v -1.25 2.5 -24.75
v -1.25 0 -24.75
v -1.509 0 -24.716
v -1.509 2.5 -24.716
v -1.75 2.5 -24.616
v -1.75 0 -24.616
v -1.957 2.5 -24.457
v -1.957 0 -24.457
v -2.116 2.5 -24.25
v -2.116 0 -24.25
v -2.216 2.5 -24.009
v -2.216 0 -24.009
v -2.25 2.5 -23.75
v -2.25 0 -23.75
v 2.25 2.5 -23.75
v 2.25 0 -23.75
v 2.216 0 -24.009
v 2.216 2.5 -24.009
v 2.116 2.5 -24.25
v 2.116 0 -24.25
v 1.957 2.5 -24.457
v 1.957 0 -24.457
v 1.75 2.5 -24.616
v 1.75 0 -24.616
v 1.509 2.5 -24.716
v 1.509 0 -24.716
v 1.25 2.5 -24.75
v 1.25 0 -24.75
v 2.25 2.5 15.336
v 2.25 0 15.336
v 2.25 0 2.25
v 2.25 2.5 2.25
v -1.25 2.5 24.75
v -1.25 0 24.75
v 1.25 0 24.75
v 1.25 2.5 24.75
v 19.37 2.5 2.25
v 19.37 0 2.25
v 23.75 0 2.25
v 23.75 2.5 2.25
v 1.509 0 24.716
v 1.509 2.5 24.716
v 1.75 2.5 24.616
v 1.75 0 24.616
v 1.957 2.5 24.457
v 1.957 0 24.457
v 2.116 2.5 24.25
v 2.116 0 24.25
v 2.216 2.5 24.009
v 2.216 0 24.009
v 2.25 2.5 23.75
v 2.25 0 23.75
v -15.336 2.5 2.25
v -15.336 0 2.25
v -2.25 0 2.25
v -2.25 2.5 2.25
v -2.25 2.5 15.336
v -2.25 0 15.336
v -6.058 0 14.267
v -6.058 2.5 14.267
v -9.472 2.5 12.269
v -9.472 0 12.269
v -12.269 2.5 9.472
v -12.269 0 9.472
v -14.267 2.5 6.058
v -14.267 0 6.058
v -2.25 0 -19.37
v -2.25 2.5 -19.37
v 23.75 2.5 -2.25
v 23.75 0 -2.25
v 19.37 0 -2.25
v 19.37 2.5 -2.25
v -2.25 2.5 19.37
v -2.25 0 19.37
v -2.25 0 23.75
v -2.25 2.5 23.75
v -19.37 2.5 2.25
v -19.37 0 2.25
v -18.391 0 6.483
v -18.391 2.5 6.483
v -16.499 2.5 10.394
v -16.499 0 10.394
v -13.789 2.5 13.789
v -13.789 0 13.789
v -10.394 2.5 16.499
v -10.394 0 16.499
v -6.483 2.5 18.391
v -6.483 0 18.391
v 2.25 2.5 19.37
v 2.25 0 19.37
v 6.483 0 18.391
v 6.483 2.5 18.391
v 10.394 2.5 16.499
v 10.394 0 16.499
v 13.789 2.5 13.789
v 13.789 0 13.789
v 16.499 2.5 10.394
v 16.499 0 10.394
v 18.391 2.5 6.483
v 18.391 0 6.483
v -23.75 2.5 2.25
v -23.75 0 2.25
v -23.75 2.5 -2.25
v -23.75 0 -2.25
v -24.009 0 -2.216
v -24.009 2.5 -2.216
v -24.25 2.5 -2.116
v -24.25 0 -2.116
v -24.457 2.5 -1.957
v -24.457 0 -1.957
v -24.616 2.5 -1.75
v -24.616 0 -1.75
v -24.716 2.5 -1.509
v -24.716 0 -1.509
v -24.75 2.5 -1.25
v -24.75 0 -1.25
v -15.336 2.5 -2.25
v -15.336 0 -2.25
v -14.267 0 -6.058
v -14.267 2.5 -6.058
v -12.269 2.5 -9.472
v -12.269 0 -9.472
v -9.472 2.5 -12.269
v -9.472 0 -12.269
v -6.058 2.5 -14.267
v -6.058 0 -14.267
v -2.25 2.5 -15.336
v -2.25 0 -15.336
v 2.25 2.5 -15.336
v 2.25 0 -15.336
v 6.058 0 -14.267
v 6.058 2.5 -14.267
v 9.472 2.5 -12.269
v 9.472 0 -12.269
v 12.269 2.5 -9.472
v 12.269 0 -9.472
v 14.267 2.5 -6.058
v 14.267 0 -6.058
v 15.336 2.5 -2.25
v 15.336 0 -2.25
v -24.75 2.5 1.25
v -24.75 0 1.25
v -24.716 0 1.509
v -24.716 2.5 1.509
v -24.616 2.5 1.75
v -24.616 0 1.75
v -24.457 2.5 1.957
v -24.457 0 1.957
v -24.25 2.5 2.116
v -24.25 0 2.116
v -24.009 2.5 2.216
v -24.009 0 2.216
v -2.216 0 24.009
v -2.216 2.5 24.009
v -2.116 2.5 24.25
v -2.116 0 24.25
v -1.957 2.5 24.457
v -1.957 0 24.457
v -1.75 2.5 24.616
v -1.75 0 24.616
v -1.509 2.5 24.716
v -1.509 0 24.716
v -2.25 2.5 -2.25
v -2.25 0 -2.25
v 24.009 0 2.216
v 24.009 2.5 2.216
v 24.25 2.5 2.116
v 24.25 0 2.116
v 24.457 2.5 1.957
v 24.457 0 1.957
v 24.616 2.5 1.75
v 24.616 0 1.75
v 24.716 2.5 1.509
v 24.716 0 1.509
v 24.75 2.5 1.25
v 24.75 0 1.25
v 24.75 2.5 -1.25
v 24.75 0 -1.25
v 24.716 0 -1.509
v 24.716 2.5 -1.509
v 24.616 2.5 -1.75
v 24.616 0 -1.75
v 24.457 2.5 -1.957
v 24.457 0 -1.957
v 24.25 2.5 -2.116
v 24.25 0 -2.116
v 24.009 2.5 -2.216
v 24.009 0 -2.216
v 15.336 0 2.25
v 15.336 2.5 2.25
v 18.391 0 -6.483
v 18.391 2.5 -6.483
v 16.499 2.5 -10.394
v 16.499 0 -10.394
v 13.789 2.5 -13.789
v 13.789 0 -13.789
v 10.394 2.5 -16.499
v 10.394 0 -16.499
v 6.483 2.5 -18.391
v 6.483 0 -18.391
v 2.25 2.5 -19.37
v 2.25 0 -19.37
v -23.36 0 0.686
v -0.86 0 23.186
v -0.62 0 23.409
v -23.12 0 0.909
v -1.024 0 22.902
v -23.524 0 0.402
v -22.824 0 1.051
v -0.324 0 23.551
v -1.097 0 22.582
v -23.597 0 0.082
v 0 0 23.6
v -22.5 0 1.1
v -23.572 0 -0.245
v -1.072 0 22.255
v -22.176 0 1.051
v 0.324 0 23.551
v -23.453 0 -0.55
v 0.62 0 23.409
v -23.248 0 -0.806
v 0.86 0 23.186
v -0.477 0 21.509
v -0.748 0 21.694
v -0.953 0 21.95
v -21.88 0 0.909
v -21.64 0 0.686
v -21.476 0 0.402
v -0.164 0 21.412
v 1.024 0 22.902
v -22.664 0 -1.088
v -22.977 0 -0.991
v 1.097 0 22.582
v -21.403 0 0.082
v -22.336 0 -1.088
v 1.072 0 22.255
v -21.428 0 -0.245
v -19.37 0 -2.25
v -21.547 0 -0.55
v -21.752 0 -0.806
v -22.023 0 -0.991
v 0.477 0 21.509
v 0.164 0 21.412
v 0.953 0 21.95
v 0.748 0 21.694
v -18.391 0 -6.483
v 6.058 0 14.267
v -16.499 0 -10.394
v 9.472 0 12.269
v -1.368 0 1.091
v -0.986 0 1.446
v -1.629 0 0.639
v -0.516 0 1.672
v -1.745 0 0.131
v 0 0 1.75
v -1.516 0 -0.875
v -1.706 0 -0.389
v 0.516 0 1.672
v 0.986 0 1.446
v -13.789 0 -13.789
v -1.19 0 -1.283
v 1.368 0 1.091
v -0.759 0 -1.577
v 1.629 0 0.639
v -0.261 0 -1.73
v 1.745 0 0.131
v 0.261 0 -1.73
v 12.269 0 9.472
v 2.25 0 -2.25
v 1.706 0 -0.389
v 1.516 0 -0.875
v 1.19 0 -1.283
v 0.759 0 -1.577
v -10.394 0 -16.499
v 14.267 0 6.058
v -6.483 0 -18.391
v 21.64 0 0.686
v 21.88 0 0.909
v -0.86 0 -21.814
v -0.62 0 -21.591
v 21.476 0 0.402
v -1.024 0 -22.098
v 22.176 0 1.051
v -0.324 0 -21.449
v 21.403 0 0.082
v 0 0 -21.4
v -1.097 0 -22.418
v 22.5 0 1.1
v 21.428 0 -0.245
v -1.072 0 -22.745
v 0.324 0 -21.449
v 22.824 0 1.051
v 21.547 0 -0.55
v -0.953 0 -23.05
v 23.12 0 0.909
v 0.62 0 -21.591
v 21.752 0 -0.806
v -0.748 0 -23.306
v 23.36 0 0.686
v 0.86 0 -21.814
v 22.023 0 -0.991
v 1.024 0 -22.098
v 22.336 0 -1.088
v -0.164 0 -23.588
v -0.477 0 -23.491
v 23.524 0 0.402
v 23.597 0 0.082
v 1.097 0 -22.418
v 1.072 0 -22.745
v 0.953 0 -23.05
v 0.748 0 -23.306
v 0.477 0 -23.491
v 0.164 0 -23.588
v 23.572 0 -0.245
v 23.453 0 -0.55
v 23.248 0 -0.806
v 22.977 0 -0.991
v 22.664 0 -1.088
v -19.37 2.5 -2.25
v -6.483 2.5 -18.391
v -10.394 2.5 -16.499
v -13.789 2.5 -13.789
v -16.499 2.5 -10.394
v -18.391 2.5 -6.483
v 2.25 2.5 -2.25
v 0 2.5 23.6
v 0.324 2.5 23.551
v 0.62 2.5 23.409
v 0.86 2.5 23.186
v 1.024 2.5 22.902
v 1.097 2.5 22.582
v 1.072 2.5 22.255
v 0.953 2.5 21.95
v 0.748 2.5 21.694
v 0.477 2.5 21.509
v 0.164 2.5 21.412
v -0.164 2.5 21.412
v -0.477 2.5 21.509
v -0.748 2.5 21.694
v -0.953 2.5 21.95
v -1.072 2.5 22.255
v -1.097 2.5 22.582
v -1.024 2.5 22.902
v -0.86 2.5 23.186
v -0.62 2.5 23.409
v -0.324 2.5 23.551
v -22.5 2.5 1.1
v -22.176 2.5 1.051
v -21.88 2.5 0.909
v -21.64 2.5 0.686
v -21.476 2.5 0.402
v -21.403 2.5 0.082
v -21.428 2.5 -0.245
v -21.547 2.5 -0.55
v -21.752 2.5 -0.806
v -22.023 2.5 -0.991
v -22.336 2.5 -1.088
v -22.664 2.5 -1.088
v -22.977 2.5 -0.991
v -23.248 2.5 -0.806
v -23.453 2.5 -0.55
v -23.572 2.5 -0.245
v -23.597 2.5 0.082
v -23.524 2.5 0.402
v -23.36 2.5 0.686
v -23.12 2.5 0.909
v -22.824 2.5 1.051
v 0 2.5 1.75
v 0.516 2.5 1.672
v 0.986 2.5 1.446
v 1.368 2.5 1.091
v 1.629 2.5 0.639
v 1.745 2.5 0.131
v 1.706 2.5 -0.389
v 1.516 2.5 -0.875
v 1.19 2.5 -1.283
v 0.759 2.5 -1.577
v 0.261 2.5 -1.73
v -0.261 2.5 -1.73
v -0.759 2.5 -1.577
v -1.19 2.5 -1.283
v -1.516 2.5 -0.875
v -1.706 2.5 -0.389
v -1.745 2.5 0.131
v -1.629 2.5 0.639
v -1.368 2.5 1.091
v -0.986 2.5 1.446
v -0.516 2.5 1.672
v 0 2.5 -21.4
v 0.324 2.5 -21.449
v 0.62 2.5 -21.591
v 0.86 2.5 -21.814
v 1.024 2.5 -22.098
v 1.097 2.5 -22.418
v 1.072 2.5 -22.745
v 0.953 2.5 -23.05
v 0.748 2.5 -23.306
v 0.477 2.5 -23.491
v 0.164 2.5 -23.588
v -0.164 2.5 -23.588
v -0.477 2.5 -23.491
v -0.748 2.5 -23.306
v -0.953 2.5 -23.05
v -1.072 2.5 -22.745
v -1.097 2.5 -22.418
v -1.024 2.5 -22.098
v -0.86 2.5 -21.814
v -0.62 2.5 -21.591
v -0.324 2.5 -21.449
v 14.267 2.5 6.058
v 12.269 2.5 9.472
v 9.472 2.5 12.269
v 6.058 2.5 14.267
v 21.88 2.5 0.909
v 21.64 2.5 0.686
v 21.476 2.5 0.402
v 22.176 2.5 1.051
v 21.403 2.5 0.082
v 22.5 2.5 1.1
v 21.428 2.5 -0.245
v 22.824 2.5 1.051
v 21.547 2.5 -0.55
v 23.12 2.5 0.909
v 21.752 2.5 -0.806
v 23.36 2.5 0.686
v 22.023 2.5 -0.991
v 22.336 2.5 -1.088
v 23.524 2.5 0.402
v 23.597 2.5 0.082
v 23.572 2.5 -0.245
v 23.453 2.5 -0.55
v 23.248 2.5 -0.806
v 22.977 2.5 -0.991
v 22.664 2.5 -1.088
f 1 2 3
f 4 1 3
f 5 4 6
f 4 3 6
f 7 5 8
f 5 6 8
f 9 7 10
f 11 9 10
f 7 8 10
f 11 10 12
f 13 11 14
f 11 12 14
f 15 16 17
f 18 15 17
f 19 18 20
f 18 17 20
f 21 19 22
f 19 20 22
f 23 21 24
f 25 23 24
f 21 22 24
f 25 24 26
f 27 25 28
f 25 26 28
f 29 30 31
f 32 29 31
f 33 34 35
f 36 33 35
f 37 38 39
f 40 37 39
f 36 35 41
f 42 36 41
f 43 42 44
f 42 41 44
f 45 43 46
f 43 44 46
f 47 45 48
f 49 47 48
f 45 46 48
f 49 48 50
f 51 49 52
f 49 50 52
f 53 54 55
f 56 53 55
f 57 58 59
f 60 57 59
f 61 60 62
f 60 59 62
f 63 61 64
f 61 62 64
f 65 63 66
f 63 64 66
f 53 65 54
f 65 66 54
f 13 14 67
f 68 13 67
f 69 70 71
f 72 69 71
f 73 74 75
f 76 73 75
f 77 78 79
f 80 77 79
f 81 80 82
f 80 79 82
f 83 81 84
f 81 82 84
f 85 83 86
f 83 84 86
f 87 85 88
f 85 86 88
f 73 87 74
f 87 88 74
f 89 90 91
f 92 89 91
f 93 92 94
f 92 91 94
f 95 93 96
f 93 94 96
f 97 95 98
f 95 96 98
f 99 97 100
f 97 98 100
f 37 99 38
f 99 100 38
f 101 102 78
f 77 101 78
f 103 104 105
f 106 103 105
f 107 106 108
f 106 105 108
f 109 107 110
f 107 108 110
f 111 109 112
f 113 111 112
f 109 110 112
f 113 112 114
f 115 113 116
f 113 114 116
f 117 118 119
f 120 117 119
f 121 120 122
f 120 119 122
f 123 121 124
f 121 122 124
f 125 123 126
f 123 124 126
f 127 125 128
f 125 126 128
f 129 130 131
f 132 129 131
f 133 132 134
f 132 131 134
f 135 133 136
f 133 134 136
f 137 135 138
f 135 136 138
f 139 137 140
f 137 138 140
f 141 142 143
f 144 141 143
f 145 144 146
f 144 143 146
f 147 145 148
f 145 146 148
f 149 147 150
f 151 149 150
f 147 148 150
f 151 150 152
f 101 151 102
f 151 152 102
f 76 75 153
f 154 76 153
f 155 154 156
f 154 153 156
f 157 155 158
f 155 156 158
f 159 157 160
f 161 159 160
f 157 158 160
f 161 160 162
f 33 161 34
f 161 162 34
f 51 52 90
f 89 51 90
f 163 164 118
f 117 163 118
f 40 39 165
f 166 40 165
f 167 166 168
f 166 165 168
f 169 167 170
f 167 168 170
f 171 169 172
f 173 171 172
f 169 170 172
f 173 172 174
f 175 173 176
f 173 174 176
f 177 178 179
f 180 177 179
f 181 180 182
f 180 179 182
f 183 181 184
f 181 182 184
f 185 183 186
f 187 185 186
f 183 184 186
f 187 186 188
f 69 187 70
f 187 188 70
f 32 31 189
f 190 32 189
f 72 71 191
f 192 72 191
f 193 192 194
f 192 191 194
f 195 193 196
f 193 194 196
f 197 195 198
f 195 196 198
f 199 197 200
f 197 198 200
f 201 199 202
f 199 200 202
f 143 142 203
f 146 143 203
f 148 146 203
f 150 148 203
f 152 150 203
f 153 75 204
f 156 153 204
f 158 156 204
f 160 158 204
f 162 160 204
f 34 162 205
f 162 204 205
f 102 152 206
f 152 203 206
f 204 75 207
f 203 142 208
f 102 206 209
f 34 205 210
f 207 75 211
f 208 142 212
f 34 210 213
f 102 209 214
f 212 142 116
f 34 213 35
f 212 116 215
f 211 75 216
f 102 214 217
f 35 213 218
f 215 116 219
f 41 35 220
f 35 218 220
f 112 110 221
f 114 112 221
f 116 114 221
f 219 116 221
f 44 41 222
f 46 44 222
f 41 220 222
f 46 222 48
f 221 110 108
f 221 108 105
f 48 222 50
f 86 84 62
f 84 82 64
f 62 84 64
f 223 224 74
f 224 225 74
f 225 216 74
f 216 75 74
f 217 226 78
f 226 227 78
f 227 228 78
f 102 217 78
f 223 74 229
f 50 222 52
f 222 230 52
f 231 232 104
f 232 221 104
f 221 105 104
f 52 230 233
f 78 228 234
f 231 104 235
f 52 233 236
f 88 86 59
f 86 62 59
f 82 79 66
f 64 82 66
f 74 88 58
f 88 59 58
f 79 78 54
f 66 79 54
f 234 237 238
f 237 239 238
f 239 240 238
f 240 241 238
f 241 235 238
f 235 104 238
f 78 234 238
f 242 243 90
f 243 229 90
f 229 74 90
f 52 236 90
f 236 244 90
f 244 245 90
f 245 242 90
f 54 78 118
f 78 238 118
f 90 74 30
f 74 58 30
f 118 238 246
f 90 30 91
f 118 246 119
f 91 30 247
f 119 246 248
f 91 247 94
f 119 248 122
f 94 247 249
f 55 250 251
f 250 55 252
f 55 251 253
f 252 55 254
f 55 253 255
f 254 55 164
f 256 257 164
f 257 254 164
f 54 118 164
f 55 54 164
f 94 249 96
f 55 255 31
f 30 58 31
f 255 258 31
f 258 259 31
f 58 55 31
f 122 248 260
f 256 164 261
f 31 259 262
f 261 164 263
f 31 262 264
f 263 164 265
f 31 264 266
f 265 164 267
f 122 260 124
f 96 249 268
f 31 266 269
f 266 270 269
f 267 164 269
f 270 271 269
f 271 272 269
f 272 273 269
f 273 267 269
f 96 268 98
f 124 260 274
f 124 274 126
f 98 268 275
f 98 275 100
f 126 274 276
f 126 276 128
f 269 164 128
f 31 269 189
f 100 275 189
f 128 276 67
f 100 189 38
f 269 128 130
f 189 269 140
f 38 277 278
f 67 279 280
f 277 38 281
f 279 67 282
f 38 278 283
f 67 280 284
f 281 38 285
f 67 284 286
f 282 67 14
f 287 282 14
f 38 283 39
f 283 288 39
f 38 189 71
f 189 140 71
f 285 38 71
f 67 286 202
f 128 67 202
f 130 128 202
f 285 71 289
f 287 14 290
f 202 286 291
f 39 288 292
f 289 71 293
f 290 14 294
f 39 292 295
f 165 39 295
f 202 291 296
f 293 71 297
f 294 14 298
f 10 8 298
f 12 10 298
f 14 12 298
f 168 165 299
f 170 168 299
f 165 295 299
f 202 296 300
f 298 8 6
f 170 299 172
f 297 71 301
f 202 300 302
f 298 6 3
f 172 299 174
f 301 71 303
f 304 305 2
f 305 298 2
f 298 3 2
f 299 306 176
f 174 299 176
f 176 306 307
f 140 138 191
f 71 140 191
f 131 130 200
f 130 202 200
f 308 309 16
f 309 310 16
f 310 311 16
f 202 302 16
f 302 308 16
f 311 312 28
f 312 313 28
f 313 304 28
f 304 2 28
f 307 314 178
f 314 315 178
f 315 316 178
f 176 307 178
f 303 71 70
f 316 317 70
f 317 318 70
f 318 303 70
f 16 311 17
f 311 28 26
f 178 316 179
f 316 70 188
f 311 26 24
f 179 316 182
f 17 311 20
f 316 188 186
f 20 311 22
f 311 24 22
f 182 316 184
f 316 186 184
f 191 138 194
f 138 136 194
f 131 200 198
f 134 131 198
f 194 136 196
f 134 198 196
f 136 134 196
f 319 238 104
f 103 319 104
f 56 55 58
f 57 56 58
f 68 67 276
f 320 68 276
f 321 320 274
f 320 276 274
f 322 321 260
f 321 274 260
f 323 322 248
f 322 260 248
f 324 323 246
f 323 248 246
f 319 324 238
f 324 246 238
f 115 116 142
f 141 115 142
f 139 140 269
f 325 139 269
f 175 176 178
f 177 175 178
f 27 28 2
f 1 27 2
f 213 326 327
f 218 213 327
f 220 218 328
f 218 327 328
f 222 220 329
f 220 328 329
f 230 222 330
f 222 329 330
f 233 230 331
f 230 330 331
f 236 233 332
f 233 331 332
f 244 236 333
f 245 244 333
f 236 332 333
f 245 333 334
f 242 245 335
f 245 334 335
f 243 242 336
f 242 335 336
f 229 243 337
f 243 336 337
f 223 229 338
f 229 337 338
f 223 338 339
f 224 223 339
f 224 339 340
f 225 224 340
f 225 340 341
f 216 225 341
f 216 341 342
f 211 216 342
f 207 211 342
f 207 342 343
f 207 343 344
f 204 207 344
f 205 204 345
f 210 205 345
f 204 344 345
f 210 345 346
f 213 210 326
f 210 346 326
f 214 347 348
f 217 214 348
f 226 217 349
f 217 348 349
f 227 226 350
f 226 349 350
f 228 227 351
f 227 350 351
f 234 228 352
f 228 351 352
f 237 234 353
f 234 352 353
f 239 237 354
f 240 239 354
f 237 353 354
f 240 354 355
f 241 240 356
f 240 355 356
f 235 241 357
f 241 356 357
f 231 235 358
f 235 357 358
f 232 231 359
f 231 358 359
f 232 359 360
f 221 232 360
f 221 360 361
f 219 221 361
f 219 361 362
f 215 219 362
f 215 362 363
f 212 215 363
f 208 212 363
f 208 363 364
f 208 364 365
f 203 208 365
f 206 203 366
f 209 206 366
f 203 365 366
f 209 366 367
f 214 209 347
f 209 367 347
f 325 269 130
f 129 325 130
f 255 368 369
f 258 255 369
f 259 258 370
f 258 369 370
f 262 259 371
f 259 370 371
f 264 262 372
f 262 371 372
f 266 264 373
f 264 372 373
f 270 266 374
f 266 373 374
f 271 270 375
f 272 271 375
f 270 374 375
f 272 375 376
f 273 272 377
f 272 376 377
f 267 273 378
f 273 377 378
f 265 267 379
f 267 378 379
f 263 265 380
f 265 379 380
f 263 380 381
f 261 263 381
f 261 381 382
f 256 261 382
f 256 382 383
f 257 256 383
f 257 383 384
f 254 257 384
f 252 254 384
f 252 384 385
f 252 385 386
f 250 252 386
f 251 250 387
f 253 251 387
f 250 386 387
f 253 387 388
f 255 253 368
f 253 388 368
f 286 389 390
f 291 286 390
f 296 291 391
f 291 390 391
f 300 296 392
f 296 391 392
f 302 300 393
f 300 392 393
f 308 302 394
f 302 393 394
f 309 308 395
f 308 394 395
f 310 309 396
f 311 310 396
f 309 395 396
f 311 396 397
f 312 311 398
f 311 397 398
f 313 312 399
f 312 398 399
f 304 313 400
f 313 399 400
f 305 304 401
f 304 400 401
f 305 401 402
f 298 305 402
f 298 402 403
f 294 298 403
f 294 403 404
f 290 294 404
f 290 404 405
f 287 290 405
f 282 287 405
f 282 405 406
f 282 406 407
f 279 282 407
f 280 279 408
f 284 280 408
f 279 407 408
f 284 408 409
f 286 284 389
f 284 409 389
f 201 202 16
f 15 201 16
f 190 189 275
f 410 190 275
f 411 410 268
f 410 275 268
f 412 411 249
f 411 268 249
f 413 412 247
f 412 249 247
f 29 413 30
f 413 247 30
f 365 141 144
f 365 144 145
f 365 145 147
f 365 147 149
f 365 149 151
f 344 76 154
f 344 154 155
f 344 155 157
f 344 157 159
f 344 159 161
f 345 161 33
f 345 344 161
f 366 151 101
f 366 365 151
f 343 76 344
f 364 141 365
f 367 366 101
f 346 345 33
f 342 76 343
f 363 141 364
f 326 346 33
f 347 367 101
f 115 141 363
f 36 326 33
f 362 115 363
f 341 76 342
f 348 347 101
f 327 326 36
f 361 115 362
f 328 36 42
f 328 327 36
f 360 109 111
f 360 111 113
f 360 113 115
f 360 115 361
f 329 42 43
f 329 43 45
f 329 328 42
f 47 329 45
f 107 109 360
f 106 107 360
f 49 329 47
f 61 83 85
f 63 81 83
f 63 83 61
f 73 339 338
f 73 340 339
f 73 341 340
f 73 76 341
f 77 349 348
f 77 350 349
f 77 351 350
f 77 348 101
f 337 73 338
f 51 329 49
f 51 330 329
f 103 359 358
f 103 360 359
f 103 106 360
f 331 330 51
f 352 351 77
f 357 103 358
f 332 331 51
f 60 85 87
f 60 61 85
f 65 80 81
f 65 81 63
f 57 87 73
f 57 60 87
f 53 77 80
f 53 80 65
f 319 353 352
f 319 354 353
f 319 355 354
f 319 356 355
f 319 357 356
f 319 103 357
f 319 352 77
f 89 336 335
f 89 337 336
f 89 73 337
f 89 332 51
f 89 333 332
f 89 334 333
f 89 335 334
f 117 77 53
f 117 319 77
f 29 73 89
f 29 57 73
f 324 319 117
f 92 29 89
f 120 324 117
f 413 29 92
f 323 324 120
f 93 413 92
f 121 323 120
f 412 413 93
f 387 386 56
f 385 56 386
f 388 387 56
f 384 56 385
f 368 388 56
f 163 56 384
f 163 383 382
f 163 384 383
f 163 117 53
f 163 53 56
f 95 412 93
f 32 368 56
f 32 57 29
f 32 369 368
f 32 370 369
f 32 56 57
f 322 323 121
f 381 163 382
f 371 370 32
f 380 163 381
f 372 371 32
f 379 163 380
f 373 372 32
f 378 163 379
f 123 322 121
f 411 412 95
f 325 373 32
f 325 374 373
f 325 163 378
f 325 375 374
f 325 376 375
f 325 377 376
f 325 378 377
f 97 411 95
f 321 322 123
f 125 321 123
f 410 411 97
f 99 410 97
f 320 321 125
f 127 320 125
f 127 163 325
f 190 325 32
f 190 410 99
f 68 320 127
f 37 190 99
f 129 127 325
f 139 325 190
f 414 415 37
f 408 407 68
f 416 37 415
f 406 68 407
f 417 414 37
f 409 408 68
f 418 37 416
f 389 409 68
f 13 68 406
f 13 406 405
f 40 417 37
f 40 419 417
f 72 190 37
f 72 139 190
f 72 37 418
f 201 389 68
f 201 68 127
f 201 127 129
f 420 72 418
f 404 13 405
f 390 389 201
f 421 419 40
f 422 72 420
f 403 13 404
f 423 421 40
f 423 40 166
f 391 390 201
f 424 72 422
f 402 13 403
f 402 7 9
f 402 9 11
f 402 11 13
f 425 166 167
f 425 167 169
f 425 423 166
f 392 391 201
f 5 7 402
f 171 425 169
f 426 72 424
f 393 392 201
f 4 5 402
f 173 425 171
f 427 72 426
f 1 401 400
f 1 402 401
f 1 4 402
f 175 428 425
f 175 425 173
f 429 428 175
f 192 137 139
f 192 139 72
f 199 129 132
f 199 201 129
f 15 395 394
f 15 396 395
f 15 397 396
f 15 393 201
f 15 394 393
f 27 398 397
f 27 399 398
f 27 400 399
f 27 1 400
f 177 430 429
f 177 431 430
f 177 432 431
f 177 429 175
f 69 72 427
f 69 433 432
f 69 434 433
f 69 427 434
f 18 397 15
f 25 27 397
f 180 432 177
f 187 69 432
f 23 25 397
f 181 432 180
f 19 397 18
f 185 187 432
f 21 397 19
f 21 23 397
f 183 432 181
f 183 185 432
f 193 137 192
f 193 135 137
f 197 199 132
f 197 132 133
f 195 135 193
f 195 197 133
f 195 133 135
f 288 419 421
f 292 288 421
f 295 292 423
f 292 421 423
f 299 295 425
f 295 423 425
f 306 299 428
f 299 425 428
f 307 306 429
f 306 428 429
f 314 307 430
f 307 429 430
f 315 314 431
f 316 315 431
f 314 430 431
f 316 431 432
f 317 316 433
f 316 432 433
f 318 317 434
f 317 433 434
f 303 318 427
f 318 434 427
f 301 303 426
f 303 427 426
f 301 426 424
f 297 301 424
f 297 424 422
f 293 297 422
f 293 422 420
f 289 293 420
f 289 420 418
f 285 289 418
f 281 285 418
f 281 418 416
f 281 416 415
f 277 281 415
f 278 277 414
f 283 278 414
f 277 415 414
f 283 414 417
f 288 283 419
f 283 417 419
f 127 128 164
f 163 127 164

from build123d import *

# Parameters (mm, degrees)
CROQUIS1_W              = 4.5
CROQUIS1_H              = 4.5
SALIENTE_EXTRUIR1_DEPTH = 2.5
CROQUIS2_R              = 1.75
CROQUIS2_R_2            = 1.1
CORTAR_EXTRUIR1_DEPTH   = 2.5


with BuildPart() as part:
    # Croquis1 → Saliente-Extruir1 (new body)
    with BuildSketch(Plane(origin=(0, 0, 0), x_dir=(1, 0, 0), z_dir=(0, 1, 0))):
        with BuildLine():
            ThreePointArc((-19.369757355, -2.25), (-13.788582233, -13.788582233), (-2.25, -19.369757355))
            Line((-2.25, -19.369757355), (-2.25, -15.335824073))
            ThreePointArc((-2.25, -15.335824073), (-10.960155108, -10.960155108), (-15.335824073, -2.25))
            Line((-15.335824073, -2.25), (-19.369757355, -2.25))
        make_face()
        with BuildLine():
            Line((-23.75, -2.25), (-19.369757355, -2.25))
            ThreePointArc((-19.369757355, -2.25), (-19.5, 0), (-19.369757355, 2.25))
            Line((-19.369757355, 2.25), (-23.75, 2.25))
            ThreePointArc((-23.75, 2.25), (-24.457106781, 1.957106781), (-24.75, 1.25))
            Line((-24.75, 1.25), (-24.75, -1.25))
            ThreePointArc((-24.75, -1.25), (-24.457106781, -1.957106781), (-23.75, -2.25))
        make_face()
        with BuildLine():
            Line((15.335824073, -2.25), (19.369757355, -2.25))
            ThreePointArc((19.369757355, -2.25), (19.467412109, -1.126883218), (19.5, 0))
            ThreePointArc((19.5, 0), (19.467412109, 1.126883218), (19.369757355, 2.25))
            Line((19.369757355, 2.25), (15.335824073, 2.25))
            ThreePointArc((15.335824073, 2.25), (15.458901532, 1.127990884), (15.5, 0))
            ThreePointArc((15.5, 0), (15.458901532, -1.127990884), (15.335824073, -2.25))
        make_face()
        with BuildLine():
            ThreePointArc((-19.369757355, 2.25), (-19.5, 0), (-19.369757355, -2.25))
            Line((-19.369757355, -2.25), (-15.335824073, -2.25))
            ThreePointArc((-15.335824073, -2.25), (-15.5, 0), (-15.335824073, 2.25))
            Line((-15.335824073, 2.25), (-19.369757355, 2.25))
        make_face()
        with BuildLine():
            Line((-2.25, 23.75), (-2.25, 19.369757355))
            ThreePointArc((-2.25, 19.369757355), (0, 19.5), (2.25, 19.369757355))
            Line((2.25, 19.369757355), (2.25, 23.75))
            ThreePointArc((2.25, 23.75), (1.957106781, 24.457106781), (1.25, 24.75))
            Line((1.25, 24.75), (-1.25, 24.75))
            ThreePointArc((-1.25, 24.75), (-1.957106781, 24.457106781), (-2.25, 23.75))
        make_face()
        with BuildLine():
            ThreePointArc((-2.25, 19.369757355), (-13.788582233, 13.788582233), (-19.369757355, 2.25))
            Line((-19.369757355, 2.25), (-15.335824073, 2.25))
            ThreePointArc((-15.335824073, 2.25), (-10.960155108, 10.960155108), (-2.25, 15.335824073))
            Line((-2.25, 15.335824073), (-2.25, 19.369757355))
        make_face()
        with BuildLine():
            ThreePointArc((-2.25, -19.369757355), (0, -19.5), (2.25, -19.369757355))
            Line((2.25, -19.369757355), (2.25, -15.335824073))
            ThreePointArc((2.25, -15.335824073), (0, -15.5), (-2.25, -15.335824073))
            Line((-2.25, -15.335824073), (-2.25, -19.369757355))
        make_face()
        with BuildLine():
            ThreePointArc((2.25, 19.369757355), (0, 19.5), (-2.25, 19.369757355))
            Line((-2.25, 19.369757355), (-2.25, 15.335824073))
            ThreePointArc((-2.25, 15.335824073), (0, 15.5), (2.25, 15.335824073))
            Line((2.25, 15.335824073), (2.25, 19.369757355))
        make_face()
        with BuildLine():
            Line((15.335824073, 2.25), (19.369757355, 2.25))
            ThreePointArc((19.369757355, 2.25), (13.788582233, 13.788582233), (2.25, 19.369757355))
            Line((2.25, 19.369757355), (2.25, 15.335824073))
            ThreePointArc((2.25, 15.335824073), (10.960155108, 10.960155108), (15.335824073, 2.25))
        make_face()
        with BuildLine():
            ThreePointArc((19.5, 0), (19.467412109, -1.126883218), (19.369757355, -2.25))
            Line((19.369757355, -2.25), (23.75, -2.25))
            ThreePointArc((23.75, -2.25), (24.457106781, -1.957106781), (24.75, -1.25))
            Line((24.75, -1.25), (24.75, 1.25))
            ThreePointArc((24.75, 1.25), (24.457106781, 1.957106781), (23.75, 2.25))
            Line((23.75, 2.25), (19.369757355, 2.25))
            ThreePointArc((19.369757355, 2.25), (19.467412109, 1.126883218), (19.5, 0))
        make_face()
        with BuildLine():
            Line((-1.25, -24.75), (1.25, -24.75))
            ThreePointArc((1.25, -24.75), (1.957106781, -24.457106781), (2.25, -23.75))
            Line((2.25, -23.75), (2.25, -19.369757355))
            ThreePointArc((2.25, -19.369757355), (0, -19.5), (-2.25, -19.369757355))
            Line((-2.25, -19.369757355), (-2.25, -23.75))
            ThreePointArc((-2.25, -23.75), (-1.957106781, -24.457106781), (-1.25, -24.75))
        make_face()
        with BuildLine():
            Line((2.25, -15.335824073), (2.25, -19.369757355))
            ThreePointArc((2.25, -19.369757355), (13.788582233, -13.788582233), (19.369757355, -2.25))
            Line((19.369757355, -2.25), (15.335824073, -2.25))
            ThreePointArc((15.335824073, -2.25), (10.960155108, -10.960155108), (2.25, -15.335824073))
        make_face()
        with BuildLine():
            ThreePointArc((-2.25, -15.335824073), (0, -15.5), (2.25, -15.335824073))
            Line((2.25, -15.335824073), (2.25, -2.25))
            Line((2.25, -2.25), (-2.25, -2.25))
            Line((-2.25, -2.25), (-2.25, -15.335824073))
        make_face()
        with BuildLine():
            Line((-15.335824073, -2.25), (-2.25, -2.25))
            Line((-2.25, -2.25), (-2.25, 2.25))
            Line((-2.25, 2.25), (-15.335824073, 2.25))
            ThreePointArc((-15.335824073, 2.25), (-15.5, 0), (-15.335824073, -2.25))
        make_face()
        with BuildLine():
            Line((-2.25, 2.25), (2.25, 2.25))
            Line((2.25, 2.25), (2.25, 15.335824073))
            ThreePointArc((2.25, 15.335824073), (0, 15.5), (-2.25, 15.335824073))
            Line((-2.25, 15.335824073), (-2.25, 2.25))
        make_face()
        Rectangle(CROQUIS1_W, CROQUIS1_H)
        with BuildLine():
            Line((2.25, 2.25), (2.25, -2.25))
            Line((2.25, -2.25), (15.335824073, -2.25))
            ThreePointArc((15.335824073, -2.25), (15.458901532, -1.127990884), (15.5, 0))
            ThreePointArc((15.5, 0), (15.458901532, 1.127990884), (15.335824073, 2.25))
            Line((15.335824073, 2.25), (2.25, 2.25))
        make_face()
    extrude(amount=SALIENTE_EXTRUIR1_DEPTH)

    # Croquis2 → Cortar-Extruir1 (cut)
    with BuildSketch(Plane(origin=(0, 2.5, 0), x_dir=(1, 0, 0), z_dir=(0, 1, 0))):
        with Locations(Location((0, 0, 0), (0, 0, 270))):
            Circle(CROQUIS2_R)
        with Locations(Location((-22.5, 0, 0), (0, 0, 270))):
            Circle(CROQUIS2_R_2)
        with Locations(Location((0, 22.5, 0), (0, 0, 270))):
            Circle(CROQUIS2_R_2)
        with Locations(Location((22.5, 0, 0), (0, 0, 270))):
            Circle(CROQUIS2_R_2)
        with Locations(Location((0, -22.5, 0), (0, 0, 270))):
            Circle(CROQUIS2_R_2)
    extrude(amount=-CORTAR_EXTRUIR1_DEPTH, mode=Mode.SUBTRACT)


solid = part.part
